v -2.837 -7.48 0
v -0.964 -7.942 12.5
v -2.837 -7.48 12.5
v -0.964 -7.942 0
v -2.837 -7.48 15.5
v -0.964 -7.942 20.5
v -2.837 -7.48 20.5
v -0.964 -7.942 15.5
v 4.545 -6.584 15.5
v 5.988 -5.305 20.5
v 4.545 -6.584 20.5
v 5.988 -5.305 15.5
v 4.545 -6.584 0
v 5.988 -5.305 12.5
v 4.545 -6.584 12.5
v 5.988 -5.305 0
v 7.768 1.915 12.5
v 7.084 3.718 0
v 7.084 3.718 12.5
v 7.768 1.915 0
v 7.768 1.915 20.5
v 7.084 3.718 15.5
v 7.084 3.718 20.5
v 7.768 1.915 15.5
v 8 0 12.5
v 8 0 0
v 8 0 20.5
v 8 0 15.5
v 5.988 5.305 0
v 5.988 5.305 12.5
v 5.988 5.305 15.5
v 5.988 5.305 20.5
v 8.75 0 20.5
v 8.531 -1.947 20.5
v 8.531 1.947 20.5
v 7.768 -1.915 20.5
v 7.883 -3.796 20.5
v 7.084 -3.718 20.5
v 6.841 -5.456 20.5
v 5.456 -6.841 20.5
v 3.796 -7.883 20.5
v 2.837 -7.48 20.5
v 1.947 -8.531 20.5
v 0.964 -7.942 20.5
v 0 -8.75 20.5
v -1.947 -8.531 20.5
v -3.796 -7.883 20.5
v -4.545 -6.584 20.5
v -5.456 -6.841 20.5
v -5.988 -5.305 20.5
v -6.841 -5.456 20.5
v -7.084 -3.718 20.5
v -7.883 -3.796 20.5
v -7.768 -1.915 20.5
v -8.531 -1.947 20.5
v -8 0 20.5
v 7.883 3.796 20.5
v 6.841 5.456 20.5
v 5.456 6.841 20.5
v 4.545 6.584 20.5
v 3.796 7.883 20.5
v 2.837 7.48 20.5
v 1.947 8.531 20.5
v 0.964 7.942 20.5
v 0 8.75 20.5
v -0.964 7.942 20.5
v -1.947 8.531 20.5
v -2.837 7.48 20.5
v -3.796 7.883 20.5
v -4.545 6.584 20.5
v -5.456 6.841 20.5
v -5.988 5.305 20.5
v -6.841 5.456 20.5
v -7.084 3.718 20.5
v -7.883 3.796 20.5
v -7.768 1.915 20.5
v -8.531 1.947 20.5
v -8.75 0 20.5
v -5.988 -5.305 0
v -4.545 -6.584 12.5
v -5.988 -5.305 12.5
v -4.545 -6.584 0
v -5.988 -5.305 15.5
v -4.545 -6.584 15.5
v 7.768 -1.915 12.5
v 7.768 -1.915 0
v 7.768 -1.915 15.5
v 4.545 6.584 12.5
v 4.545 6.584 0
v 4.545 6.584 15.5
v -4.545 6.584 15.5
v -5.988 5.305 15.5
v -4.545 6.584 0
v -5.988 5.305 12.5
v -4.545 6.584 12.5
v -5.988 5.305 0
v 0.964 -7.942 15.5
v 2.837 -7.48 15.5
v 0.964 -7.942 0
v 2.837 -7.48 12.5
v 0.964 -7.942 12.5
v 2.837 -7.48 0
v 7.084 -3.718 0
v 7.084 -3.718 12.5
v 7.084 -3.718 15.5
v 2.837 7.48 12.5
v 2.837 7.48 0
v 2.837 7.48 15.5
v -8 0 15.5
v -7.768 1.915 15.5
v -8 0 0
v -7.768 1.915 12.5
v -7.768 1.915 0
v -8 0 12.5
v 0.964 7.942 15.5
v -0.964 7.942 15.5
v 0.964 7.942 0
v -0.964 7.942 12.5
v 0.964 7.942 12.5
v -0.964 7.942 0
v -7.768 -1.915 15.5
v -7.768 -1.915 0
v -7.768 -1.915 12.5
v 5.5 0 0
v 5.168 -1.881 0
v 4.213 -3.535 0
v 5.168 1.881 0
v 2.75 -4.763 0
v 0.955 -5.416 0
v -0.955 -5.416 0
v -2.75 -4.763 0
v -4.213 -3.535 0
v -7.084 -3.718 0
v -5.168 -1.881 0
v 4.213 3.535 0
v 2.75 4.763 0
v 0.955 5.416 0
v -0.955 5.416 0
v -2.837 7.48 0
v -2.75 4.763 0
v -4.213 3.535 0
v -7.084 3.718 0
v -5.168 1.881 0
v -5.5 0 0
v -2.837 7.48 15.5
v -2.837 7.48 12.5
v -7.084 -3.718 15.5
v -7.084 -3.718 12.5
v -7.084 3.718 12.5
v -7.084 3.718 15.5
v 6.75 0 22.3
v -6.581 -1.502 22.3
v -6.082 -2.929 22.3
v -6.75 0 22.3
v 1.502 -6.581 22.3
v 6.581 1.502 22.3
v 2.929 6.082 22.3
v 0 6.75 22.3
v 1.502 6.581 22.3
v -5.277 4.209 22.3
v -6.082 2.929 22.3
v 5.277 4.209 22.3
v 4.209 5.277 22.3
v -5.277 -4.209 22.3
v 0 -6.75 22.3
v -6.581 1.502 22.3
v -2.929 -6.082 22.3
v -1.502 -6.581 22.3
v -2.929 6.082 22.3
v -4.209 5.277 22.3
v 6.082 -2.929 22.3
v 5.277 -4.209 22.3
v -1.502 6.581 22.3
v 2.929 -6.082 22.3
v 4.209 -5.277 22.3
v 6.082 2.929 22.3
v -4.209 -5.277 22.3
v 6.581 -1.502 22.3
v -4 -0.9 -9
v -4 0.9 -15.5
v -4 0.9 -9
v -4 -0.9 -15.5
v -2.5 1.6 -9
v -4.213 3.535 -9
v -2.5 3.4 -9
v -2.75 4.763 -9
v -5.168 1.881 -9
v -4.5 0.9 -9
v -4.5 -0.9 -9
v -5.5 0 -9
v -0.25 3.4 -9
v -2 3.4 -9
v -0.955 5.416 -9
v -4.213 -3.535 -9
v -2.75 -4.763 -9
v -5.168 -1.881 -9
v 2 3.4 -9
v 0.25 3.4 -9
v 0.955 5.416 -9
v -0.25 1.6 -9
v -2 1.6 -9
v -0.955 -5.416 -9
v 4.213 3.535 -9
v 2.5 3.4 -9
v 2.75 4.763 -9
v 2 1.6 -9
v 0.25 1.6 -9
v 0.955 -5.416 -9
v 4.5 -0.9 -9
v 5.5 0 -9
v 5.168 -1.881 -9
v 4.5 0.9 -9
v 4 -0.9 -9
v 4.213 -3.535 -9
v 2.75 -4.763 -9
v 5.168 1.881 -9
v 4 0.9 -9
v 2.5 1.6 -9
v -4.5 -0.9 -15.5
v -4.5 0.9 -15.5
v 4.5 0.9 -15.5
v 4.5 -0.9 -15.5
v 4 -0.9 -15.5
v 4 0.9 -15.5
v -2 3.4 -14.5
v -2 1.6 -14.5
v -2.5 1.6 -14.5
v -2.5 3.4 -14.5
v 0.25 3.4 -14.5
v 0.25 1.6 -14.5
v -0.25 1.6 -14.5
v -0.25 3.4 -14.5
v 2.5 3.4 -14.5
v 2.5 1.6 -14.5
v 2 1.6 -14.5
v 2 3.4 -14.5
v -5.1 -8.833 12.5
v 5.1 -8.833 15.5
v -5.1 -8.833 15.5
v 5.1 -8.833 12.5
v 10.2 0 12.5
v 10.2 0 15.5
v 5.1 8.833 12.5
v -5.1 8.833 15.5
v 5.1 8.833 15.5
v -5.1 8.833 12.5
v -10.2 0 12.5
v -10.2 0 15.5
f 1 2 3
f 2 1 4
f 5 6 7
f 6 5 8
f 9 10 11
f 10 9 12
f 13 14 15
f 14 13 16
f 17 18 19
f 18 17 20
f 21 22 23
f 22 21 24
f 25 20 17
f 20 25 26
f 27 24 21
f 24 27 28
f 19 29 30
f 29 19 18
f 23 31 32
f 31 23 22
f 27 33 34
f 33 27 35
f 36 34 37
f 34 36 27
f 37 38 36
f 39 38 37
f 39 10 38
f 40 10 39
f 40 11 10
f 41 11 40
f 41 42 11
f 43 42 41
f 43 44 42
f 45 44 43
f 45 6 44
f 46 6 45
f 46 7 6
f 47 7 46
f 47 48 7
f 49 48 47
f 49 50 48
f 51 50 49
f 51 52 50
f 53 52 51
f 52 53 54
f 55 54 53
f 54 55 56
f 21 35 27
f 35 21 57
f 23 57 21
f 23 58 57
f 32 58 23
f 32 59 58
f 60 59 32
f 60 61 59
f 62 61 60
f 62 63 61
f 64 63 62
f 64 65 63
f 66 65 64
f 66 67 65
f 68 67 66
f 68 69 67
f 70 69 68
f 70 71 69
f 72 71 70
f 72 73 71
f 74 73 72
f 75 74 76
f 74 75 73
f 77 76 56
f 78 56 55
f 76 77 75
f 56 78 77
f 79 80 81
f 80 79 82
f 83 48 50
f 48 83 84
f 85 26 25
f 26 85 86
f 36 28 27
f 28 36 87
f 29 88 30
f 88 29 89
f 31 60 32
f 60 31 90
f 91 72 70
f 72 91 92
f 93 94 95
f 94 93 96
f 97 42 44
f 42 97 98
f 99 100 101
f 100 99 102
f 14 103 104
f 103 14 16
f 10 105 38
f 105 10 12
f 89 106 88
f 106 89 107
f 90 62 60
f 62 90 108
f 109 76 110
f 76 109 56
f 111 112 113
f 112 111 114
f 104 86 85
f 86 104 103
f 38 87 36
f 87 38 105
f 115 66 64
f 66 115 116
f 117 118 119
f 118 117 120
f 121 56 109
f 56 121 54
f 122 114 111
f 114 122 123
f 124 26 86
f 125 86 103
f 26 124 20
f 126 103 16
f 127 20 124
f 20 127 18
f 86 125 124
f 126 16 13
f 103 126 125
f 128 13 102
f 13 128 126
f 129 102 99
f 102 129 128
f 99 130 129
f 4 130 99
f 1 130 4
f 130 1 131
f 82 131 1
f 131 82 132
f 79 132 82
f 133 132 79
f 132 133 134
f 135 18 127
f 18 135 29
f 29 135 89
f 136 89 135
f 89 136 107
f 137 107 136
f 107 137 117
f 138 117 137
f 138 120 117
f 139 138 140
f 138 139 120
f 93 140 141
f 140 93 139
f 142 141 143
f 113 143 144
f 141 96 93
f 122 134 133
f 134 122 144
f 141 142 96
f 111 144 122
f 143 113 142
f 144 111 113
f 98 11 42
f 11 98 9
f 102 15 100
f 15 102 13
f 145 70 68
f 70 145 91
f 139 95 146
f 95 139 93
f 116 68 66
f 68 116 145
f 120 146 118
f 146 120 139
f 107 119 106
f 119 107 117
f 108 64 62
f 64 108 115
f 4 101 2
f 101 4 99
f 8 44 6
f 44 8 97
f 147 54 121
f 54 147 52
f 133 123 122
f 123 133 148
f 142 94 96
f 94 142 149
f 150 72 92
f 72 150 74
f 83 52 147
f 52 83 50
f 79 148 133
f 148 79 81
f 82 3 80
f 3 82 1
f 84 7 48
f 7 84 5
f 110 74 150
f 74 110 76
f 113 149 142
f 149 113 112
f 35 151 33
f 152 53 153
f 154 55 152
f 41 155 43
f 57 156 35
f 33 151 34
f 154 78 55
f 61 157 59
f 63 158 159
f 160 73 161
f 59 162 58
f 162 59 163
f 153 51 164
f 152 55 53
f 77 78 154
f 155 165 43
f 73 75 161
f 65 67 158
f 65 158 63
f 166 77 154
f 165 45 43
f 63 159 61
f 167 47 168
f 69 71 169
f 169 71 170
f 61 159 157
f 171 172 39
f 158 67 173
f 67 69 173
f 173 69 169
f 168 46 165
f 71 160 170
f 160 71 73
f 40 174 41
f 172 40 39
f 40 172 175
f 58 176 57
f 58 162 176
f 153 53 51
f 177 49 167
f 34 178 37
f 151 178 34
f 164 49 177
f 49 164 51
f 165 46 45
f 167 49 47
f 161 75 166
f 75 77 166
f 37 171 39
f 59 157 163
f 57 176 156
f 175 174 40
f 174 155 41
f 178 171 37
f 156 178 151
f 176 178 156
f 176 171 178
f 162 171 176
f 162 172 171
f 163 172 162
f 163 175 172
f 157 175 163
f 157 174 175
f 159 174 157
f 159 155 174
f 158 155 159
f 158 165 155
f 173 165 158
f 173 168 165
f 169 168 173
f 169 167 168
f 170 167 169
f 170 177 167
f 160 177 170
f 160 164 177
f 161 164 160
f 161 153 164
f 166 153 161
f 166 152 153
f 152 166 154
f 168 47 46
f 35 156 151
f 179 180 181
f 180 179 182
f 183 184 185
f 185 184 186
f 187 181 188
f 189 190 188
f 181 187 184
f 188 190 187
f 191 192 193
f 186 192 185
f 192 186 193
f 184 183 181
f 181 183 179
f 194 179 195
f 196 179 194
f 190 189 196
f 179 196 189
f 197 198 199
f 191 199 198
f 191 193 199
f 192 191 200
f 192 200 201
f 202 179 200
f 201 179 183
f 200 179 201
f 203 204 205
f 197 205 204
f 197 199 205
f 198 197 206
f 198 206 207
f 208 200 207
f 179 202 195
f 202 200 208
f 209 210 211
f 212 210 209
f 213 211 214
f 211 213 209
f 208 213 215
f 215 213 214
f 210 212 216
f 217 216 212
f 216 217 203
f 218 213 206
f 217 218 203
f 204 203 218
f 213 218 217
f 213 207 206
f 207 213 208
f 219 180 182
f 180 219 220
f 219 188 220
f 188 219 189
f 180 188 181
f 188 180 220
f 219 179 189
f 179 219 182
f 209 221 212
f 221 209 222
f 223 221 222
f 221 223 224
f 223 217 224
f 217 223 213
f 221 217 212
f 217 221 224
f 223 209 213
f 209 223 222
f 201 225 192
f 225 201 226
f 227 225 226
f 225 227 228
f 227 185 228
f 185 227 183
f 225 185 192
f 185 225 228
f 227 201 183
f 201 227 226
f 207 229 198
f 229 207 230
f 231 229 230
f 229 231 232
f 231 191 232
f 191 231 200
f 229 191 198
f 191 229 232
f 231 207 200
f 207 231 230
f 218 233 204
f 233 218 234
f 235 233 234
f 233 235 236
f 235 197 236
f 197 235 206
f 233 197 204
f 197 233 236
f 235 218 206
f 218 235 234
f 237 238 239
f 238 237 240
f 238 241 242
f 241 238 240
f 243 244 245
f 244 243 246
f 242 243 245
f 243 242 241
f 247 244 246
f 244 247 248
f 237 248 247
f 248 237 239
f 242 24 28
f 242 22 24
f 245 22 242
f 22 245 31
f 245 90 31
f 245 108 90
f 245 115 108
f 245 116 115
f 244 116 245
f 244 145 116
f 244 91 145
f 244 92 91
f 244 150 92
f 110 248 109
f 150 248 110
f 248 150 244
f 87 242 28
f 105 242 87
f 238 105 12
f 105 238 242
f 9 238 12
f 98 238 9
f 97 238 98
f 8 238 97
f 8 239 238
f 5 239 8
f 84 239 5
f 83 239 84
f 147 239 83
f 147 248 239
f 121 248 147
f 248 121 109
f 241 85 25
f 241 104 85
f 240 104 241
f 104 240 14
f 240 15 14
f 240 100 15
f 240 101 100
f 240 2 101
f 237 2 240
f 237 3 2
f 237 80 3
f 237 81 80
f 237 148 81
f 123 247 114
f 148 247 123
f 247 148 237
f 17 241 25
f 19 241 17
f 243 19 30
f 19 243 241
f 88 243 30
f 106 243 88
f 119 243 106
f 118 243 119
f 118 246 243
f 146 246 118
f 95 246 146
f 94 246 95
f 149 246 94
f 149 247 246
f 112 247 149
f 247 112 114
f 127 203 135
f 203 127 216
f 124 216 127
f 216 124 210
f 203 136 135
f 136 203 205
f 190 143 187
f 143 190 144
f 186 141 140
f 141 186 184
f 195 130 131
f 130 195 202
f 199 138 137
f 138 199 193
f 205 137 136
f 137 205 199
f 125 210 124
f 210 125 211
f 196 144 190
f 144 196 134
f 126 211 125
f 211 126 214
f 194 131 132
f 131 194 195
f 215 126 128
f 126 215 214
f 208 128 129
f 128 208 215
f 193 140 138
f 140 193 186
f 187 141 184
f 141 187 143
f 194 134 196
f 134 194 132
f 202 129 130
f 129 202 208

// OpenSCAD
body_height=20.5;
body_radius=8;

head_height=1.8;
head_r1=8.75;
head_r2=6.75;

inner_body_radius = 5.5;
inner_body_height = 9;

long_connector_height = 6.5;
short_connector_height = 5.5;
connector_width=1.8;
connector_thickness=0.5;

bolt_outer_radius = 10.2;
bolt_inner_radius = 7.5;
bolt_height = 3;

module bolt(x, y, z) {
	translate([x, y, z]) color("silver") {
		difference() {
			cylinder(h = bolt_height, r = bolt_outer_radius, $fn=6);
			translate([0,0,-0.5]) cylinder(h = bolt_height + 1, r = bolt_inner_radius);
		}
	}
}

module connectors(x, y, z) {
	translate([x, y, z]) color("silver"){
		cube(size=[connector_thickness, connector_width, long_connector_height]);
		translate([8.5,0,0]) cube(size=[connector_thickness, connector_width, long_connector_height]);
		translate([2,2.5,1]) cube(size=[connector_thickness, connector_width, short_connector_height]);
		translate([4.25,2.5,1]) cube(size=[connector_thickness, connector_width, short_connector_height]);
		translate([6.5,2.5,1]) cube(size=[connector_thickness, connector_width, short_connector_height]);
	}
}

module waterproof_pushbutton(x, y, z, bolt_spacing) {
	translate([x, y, z]) {
		color("silver") {
			cylinder(h = body_height, r = body_radius);
			translate([0, 0, body_height]) cylinder(h = head_height, r1 = head_r1, r2 = head_r2);
		}
		color("gray") {
			translate([0,0,-inner_body_height]) cylinder(h = inner_body_height, r = inner_body_radius);
		}

		connectors(-4.5,-0.9, -inner_body_height - long_connector_height);
		bolt(0,0, body_height - 3 - bolt_spacing);
	}
}

waterproof_pushbutton(0,0,0, 5);
